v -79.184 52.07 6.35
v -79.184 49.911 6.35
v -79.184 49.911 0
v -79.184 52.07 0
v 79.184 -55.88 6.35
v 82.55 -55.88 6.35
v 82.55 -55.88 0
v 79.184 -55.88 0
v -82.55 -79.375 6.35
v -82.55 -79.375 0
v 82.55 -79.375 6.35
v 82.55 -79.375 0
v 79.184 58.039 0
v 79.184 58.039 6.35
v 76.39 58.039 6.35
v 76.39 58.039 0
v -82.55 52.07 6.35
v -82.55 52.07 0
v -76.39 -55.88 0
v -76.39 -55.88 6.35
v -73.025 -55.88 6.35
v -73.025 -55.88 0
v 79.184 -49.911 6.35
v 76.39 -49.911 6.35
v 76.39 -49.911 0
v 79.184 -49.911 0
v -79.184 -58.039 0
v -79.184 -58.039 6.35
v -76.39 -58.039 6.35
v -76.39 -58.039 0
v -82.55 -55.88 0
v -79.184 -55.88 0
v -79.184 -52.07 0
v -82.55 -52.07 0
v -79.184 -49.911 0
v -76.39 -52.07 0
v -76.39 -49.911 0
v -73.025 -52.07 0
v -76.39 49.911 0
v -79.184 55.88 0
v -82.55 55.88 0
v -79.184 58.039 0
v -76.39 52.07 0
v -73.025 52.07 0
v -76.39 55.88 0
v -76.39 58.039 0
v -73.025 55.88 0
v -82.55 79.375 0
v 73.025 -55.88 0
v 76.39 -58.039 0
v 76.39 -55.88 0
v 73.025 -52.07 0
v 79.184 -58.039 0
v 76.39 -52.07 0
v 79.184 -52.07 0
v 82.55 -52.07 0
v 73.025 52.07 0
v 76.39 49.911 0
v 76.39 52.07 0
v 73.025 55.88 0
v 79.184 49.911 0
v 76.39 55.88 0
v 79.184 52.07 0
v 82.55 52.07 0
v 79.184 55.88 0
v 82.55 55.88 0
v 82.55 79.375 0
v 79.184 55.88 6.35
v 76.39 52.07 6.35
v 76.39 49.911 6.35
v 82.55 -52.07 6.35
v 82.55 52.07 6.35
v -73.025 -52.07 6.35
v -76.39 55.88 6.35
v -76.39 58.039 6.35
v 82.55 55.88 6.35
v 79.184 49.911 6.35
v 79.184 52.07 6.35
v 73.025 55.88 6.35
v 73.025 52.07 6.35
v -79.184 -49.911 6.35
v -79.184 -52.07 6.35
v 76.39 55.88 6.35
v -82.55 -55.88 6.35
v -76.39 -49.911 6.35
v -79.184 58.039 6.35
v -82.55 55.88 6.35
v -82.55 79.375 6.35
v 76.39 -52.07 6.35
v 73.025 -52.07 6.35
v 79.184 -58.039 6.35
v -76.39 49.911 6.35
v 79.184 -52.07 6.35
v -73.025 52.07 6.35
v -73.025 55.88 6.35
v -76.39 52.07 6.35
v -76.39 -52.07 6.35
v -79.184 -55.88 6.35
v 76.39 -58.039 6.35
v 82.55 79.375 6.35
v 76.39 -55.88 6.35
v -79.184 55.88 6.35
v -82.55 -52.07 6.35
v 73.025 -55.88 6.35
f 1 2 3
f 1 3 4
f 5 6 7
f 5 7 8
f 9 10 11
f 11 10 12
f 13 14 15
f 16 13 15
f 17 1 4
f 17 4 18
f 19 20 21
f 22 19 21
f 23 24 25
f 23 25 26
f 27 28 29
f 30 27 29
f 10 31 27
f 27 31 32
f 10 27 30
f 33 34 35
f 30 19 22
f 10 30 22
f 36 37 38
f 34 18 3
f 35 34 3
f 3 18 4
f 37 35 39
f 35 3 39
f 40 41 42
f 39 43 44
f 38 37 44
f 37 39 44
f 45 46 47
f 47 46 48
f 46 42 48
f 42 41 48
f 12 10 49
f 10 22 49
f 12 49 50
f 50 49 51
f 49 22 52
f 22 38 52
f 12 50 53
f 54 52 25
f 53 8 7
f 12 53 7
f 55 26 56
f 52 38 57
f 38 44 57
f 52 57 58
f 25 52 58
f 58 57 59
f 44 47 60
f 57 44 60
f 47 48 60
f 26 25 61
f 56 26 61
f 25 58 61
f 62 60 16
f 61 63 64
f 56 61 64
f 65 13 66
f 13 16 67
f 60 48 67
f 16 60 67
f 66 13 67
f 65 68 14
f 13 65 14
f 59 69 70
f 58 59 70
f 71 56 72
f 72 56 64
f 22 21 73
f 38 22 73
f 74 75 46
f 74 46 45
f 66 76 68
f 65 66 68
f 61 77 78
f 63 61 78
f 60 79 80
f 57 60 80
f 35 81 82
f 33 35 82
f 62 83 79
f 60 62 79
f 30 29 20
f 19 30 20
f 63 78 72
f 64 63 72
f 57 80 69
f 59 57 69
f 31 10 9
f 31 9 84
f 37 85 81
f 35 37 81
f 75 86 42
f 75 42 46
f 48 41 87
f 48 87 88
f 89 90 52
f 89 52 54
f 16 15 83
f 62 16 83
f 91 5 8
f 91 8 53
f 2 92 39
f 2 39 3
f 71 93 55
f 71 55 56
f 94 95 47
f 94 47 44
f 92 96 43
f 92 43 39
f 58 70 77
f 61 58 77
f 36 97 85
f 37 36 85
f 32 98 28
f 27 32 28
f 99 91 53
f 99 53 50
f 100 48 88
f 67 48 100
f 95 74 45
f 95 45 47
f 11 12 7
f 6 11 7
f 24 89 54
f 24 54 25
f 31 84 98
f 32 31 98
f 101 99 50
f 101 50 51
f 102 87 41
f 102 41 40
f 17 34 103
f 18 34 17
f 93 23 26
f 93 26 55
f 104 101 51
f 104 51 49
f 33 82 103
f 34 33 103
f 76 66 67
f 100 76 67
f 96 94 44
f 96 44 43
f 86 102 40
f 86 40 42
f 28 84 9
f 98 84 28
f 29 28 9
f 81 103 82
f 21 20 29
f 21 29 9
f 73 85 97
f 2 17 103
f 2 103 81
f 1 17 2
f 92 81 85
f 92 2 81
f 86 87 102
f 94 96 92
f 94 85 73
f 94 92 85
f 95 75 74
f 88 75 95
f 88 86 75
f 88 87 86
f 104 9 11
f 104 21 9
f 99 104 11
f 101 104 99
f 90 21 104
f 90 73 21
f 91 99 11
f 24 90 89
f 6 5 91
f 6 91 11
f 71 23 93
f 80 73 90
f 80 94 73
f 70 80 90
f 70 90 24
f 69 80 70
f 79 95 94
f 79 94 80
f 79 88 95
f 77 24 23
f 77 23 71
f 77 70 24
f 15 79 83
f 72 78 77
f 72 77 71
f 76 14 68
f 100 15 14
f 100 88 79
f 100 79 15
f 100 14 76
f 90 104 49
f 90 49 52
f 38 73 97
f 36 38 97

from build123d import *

# Parameters (mm, degrees)
SKETCH1_W            = 165.1
SKETCH1_H            = 158.75
BOSS_EXTRUDE2_DEPTH  = 6.35
CUT_EXTRUDE1_DEPTH   = 115.696188363
MIRROR2_COPY_1_DEPTH = 115.696188363


with BuildPart() as part:
    # Sketch1 → Boss-Extrude2 (new body)
    with BuildSketch(Plane.XY):
        Rectangle(SKETCH1_W, SKETCH1_H)
    extrude(amount=BOSS_EXTRUDE2_DEPTH)

    # Sketch2 → Cut-Extrude1 (cut, through all)
    with BuildSketch(Plane.XY.offset(6.35)):
        Polygon((82.55, 55.88), (79.1845, 55.88), (79.1845, 58.039), (76.3905, 58.039), (76.3905, 55.88), (73.025, 55.88), (73.025, 52.07), (76.3905, 52.07), (76.3905, 49.911), (79.1845, 49.911), (79.1845, 52.07), (82.55, 52.07), align=None)
    cut_extrude1 = extrude(amount=-CUT_EXTRUDE1_DEPTH, mode=Mode.SUBTRACT)

    # Mirror1: Cut-Extrude1 across plane
    add(cut_extrude1.mirror(Plane.ZX), mode=Mode.SUBTRACT)

    # Mirror2: Cut-Extrude1 across plane
    add(cut_extrude1.mirror(Plane(origin=(0, 0, 0), x_dir=(0, 0, 1), z_dir=(1, 0, 0))), mode=Mode.SUBTRACT)

    # Mirror2 copy 1 sketch → Mirror2 copy 1 (cut, through all)
    with BuildSketch(Plane(origin=(0, 0, 6.35), x_dir=(-1, 0, 0), z_dir=(0, 0, 1))):
        Polygon((82.55, 55.88), (79.1845, 55.88), (79.1845, 58.039), (76.3905, 58.039), (76.3905, 55.88), (73.025, 55.88), (73.025, 52.07), (76.3905, 52.07), (76.3905, 49.911), (79.1845, 49.911), (79.1845, 52.07), (82.55, 52.07), align=None)
    extrude(amount=-MIRROR2_COPY_1_DEPTH, mode=Mode.SUBTRACT)


solid = part.part
